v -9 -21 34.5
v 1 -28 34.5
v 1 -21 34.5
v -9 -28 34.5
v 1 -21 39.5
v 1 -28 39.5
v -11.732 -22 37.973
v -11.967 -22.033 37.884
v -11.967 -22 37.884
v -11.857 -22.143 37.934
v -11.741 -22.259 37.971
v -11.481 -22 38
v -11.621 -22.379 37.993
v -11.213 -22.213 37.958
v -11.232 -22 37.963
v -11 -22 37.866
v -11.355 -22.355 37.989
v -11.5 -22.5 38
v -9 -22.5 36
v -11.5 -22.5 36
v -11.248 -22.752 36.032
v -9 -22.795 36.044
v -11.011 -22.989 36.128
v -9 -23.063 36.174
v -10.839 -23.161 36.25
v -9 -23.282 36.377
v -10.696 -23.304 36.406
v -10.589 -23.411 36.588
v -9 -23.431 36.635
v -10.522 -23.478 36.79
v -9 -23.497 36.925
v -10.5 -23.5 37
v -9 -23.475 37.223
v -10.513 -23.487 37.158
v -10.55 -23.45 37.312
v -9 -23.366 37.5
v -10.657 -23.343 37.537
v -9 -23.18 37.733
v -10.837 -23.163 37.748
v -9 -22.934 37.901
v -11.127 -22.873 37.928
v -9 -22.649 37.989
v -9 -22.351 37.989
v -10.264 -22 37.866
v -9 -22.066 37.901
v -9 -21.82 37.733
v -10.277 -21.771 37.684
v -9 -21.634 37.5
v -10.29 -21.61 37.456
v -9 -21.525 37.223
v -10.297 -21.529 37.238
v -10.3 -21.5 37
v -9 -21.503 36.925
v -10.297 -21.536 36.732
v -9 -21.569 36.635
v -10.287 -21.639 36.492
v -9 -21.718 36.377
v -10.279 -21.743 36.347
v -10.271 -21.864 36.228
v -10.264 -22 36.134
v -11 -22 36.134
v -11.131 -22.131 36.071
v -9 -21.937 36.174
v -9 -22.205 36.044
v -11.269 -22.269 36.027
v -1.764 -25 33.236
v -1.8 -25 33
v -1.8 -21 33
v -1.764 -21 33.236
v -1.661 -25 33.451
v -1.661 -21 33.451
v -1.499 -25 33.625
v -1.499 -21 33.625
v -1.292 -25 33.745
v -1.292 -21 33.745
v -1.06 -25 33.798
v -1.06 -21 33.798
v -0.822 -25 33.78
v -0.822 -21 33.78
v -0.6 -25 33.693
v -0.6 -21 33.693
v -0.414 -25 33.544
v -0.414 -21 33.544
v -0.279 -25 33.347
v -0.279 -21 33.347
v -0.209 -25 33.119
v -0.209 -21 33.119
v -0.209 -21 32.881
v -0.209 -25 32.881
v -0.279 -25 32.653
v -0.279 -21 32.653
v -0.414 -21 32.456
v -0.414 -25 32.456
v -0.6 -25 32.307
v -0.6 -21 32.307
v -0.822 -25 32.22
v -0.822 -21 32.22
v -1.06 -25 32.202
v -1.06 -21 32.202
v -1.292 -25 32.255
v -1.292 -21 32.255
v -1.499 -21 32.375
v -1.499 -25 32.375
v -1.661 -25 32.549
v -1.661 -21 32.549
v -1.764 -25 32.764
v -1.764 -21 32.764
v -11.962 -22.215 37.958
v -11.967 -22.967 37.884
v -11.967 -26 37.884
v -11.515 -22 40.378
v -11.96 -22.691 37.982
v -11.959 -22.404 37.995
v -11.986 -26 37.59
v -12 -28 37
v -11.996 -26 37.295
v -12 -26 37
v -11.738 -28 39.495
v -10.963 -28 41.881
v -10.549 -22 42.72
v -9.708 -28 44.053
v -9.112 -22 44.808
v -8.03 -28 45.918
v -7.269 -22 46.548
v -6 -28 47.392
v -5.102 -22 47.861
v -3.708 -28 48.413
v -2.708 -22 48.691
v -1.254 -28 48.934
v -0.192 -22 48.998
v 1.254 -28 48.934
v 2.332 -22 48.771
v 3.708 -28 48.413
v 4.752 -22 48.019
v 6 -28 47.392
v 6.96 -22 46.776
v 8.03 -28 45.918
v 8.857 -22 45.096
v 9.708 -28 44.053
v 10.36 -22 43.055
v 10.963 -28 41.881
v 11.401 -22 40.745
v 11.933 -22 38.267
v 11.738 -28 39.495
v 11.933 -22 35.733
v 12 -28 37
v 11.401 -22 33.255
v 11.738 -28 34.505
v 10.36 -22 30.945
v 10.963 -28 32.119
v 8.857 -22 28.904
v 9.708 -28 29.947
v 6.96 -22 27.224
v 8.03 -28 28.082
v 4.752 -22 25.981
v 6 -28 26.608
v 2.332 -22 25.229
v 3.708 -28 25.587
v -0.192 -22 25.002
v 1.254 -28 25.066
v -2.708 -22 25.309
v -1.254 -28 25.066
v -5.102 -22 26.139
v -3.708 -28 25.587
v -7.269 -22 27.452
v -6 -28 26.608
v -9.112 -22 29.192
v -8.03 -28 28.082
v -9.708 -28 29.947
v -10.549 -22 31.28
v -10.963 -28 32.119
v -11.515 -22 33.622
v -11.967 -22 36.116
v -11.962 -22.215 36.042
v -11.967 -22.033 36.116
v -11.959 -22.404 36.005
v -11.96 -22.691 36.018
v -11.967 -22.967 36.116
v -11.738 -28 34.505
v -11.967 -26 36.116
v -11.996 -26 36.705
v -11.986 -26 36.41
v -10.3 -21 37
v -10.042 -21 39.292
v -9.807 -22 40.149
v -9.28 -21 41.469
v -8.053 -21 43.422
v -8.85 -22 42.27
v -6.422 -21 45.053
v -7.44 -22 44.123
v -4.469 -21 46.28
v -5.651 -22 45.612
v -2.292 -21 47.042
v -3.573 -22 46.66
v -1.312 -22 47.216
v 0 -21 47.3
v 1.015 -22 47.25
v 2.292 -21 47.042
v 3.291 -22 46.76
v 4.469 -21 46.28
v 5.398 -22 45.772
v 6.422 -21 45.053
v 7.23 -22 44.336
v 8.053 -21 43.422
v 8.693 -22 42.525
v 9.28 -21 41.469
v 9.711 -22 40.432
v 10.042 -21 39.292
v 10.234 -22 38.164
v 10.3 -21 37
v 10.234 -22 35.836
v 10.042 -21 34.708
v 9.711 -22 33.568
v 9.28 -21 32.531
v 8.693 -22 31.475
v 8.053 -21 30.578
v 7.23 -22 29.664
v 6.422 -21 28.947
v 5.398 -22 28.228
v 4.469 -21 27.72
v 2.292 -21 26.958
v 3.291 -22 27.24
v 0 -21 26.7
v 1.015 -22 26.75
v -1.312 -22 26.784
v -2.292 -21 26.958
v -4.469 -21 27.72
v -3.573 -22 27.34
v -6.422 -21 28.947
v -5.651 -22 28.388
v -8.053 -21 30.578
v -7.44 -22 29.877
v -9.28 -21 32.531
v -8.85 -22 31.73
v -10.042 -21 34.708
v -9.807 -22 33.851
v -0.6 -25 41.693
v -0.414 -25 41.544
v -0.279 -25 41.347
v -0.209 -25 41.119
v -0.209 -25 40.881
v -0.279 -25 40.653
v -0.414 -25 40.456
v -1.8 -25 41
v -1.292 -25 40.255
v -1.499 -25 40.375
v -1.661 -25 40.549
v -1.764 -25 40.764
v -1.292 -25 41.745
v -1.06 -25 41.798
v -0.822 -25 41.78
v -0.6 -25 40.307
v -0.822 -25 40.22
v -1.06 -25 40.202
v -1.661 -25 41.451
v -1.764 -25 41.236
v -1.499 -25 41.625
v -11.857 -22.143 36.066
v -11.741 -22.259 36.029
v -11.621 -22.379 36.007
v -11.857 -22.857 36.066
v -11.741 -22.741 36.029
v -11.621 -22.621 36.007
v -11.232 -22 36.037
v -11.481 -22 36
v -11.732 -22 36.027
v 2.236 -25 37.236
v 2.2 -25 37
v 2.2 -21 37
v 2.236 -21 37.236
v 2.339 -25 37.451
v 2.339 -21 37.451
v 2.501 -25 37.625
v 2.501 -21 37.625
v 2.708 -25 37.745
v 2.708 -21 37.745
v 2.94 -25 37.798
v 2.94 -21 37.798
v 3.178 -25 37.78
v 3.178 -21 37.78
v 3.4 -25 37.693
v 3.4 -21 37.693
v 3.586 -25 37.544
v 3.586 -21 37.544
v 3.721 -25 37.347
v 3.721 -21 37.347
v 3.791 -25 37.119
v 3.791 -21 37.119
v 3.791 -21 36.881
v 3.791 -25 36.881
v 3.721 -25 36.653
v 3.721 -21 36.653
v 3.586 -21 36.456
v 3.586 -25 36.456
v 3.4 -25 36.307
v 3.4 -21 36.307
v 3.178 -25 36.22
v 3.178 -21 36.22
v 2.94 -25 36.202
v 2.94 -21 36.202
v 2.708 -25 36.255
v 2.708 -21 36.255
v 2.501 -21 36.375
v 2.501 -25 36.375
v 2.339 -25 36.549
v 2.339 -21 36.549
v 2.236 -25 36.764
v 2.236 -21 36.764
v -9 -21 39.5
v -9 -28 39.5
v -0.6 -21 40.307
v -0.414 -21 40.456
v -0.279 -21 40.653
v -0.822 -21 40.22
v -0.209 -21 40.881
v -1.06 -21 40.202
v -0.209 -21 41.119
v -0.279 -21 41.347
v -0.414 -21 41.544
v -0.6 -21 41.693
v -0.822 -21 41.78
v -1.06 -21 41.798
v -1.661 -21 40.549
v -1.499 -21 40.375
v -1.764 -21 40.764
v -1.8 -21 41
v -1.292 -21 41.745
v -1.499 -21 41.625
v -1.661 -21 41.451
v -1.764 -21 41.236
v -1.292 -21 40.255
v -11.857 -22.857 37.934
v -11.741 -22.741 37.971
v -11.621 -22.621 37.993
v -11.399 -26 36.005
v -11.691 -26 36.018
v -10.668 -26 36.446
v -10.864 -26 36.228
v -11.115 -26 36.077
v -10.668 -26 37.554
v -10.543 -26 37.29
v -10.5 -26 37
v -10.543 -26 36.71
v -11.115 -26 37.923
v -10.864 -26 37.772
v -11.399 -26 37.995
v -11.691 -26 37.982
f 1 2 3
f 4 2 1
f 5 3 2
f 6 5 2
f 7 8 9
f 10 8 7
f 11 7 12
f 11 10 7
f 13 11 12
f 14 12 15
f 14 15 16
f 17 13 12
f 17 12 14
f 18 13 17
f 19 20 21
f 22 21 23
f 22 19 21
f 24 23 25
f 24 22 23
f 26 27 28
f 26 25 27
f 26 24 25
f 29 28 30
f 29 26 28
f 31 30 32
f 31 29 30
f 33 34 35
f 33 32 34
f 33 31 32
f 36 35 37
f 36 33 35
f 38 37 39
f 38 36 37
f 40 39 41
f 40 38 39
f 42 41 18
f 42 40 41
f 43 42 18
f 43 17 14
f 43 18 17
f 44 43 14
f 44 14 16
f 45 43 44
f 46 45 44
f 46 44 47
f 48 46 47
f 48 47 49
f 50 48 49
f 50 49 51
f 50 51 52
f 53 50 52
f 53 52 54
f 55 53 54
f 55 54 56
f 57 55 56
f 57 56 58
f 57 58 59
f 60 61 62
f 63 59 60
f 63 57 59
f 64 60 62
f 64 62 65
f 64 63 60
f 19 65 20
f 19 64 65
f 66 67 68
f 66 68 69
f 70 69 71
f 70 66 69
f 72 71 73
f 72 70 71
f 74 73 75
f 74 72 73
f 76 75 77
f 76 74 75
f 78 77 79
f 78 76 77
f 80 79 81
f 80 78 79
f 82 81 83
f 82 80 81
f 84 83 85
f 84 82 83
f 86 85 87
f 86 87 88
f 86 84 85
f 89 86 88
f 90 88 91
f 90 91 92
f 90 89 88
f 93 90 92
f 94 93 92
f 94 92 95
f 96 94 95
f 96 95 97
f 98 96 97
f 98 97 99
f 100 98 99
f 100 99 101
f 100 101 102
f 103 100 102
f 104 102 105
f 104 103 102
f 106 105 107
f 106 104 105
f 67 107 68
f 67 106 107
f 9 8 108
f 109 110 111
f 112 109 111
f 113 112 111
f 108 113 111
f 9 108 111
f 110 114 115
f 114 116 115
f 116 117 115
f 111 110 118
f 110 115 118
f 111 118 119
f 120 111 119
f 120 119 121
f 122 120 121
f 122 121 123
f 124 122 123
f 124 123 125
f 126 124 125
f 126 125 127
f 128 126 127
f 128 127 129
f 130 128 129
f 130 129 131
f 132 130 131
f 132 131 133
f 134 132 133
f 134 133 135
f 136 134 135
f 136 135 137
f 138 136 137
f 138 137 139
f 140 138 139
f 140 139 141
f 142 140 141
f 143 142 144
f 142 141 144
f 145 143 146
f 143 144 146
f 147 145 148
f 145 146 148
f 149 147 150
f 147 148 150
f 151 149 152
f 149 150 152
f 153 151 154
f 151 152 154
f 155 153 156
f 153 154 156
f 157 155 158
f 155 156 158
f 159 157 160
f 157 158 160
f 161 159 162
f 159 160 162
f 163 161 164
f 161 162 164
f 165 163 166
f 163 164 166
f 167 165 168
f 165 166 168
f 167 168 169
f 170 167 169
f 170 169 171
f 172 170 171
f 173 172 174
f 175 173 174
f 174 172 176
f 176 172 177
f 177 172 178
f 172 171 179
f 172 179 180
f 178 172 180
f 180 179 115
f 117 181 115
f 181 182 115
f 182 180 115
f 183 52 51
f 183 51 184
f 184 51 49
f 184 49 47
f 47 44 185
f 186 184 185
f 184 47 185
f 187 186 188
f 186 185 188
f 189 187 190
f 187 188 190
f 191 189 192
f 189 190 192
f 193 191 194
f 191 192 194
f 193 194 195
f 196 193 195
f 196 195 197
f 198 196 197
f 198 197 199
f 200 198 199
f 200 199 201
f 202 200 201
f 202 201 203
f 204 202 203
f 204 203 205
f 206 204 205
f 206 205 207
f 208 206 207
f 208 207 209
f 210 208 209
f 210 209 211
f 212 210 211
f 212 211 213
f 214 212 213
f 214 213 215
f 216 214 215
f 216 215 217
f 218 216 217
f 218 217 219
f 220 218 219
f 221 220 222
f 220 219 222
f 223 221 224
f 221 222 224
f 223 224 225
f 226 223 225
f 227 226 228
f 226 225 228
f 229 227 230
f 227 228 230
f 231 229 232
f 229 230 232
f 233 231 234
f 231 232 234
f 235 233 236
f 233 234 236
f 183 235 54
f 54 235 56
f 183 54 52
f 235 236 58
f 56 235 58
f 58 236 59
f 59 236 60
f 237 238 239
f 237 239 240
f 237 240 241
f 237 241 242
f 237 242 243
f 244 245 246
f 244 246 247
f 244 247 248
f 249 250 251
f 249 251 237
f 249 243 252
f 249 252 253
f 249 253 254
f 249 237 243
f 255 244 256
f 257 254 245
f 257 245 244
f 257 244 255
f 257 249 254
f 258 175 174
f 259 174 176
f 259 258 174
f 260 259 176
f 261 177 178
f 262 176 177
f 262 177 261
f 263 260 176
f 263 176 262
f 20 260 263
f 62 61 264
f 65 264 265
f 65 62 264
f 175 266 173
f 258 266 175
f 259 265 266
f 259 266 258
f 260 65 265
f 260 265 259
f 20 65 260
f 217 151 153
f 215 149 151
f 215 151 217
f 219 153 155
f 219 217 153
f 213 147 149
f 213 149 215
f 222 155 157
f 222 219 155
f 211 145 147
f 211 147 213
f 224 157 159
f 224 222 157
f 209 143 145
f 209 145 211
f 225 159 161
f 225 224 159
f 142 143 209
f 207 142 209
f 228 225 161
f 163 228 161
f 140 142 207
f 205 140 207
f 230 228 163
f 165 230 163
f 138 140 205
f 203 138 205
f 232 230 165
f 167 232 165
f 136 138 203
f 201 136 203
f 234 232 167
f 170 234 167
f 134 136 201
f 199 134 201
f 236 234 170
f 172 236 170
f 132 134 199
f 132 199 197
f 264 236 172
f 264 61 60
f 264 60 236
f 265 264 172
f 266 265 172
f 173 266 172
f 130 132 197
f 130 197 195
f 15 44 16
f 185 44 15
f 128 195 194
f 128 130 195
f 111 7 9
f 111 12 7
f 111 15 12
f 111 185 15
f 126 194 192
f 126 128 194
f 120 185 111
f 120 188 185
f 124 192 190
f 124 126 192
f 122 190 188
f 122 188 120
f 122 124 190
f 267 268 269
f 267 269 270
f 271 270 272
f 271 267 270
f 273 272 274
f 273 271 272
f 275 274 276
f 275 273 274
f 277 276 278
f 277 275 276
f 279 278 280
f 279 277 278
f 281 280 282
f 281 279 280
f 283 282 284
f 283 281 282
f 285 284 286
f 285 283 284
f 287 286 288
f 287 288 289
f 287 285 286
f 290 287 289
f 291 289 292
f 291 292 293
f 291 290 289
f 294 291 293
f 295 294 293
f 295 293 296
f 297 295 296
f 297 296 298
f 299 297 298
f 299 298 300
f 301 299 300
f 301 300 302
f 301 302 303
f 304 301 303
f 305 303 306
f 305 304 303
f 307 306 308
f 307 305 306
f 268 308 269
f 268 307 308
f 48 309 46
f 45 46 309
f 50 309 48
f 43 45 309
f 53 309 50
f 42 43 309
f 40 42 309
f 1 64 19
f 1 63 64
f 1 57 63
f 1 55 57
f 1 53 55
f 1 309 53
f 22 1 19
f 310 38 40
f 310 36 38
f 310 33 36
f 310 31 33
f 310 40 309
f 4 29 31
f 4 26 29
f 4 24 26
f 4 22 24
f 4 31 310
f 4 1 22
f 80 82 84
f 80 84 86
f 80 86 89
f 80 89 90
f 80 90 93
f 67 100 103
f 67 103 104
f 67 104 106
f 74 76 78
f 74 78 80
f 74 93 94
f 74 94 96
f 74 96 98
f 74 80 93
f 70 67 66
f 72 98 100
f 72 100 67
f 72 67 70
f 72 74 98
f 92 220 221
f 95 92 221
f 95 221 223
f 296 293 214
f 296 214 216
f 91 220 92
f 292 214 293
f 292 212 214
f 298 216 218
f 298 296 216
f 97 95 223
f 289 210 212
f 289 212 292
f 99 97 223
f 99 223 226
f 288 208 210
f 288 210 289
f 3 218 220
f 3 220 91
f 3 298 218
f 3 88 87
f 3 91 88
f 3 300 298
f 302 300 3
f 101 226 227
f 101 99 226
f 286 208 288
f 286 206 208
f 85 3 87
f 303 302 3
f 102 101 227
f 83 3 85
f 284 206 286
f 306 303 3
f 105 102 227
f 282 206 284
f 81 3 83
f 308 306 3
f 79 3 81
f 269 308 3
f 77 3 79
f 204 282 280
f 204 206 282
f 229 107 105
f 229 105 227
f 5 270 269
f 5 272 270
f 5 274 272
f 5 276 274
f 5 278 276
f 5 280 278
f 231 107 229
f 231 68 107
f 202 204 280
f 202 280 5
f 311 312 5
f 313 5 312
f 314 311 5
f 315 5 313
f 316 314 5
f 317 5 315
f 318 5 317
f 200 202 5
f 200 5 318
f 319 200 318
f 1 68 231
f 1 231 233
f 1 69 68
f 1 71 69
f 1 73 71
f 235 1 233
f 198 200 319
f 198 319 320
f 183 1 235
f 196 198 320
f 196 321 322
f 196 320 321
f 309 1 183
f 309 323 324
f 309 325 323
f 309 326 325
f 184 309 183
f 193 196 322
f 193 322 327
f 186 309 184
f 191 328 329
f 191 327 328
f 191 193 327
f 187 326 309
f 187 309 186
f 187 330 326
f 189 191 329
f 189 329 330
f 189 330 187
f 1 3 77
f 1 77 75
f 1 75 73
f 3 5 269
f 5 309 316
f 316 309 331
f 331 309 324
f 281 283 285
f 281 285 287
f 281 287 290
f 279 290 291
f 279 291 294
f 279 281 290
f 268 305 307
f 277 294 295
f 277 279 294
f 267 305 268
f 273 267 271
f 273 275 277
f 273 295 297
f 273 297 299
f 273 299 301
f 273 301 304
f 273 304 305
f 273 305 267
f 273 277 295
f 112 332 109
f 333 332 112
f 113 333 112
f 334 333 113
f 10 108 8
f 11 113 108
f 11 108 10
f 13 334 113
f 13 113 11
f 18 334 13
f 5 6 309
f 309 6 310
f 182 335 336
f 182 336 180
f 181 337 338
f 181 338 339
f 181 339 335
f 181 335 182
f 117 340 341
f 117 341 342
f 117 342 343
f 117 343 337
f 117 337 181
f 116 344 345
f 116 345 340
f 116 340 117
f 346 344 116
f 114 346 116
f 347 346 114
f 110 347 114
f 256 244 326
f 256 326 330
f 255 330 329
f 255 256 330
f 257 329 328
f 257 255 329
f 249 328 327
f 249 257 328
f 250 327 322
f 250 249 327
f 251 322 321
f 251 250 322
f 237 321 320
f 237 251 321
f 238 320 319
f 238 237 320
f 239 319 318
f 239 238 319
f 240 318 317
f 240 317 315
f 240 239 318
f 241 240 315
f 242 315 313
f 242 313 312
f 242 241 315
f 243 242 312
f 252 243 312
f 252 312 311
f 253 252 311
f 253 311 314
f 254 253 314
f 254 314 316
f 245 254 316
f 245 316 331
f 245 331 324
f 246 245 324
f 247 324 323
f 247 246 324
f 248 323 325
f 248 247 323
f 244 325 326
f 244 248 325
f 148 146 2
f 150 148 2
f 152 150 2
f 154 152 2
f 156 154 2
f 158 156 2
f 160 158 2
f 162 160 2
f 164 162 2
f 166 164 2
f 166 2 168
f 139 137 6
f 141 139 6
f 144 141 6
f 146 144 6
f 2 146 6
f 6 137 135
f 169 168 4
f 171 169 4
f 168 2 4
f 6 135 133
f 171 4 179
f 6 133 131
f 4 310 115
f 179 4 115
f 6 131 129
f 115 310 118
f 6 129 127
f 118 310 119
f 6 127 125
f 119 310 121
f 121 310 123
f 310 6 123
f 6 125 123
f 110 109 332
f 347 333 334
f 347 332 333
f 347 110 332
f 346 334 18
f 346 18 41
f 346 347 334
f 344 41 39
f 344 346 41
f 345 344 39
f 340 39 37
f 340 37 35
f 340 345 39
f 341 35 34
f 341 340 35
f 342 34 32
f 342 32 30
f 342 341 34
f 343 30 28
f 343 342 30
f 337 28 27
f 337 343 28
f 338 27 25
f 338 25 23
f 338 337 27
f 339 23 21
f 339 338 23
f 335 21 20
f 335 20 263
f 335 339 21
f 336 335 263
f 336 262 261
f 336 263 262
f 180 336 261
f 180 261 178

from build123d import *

# Parameters (mm, degrees)
CYLINDER014005814004009_R           = 1
CYLINDER014005814004009_DEPTH       = 12
CYLINDER014005814004009_PITCH_ANGLE = 90
CYLINDER014005814004010_R           = 1
CYLINDER014005814004010_DEPTH       = 4
CYLINDER014005814004010_ROLL_ANGLE  = 90
CYLINDER014005814004011_R           = 0.8
CYLINDER014005814004011_DEPTH       = 4
CYLINDER014005814004011_ROLL_ANGLE  = 90
CYLINDER014005814004012_R           = 0.8
CYLINDER014005814004012_DEPTH       = 4
CYLINDER014005814004012_ROLL_ANGLE  = 90
CYLINDER014005814004013_R           = 0.8
CYLINDER014005814004013_DEPTH       = 4
CYLINDER014005814004013_ROLL_ANGLE  = 90
BOX209_W                            = 10
BOX209_H                            = 11
BOX209_DEPTH                        = 5
CYLINDER014005814004008_R           = 10.3
CYLINDER014005814004008_DEPTH       = 7
CYLINDER014005814004008_ROLL_ANGLE  = 90
CYLINDER014005814004007_R           = 12
CYLINDER014005814004007_DEPTH       = 6
CYLINDER014005814004007_ROLL_ANGLE  = 90
CUT061098127_PLACEMENT_ANGLE        = 180


with BuildPart() as v_lec735:
    # Cylinder014005814004009 → Cylinder014005814004009 (new body)
    with BuildSketch(Plane.XY):
        Circle(CYLINDER014005814004009_R)
    extrude(amount=CYLINDER014005814004009_DEPTH)


with BuildPart() as v_lec735_1:
    # Cylinder014005814004009 pitch: moved
    add(v_lec735.part.rotate(Axis((0, 0, 0), (0, 1, 0)), CYLINDER014005814004009_PITCH_ANGLE))


with BuildPart() as v_lec735_2:
    # Cylinder014005814004009 placement: moved
    add(v_lec735_1.part.moved(Location((0, -5.5, 0))))


with BuildPart() as v_lec736:
    # Cylinder014005814004010 → Cylinder014005814004010 (new body)
    with BuildSketch(Plane.XY):
        Circle(CYLINDER014005814004010_R)
    extrude(amount=CYLINDER014005814004010_DEPTH)


with BuildPart() as v_lec736_1:
    # Cylinder014005814004010 roll: moved
    add(v_lec736.part.rotate(Axis((0, 0, 0), (1, 0, 0)), CYLINDER014005814004010_ROLL_ANGLE))


with BuildPart() as v_lec736_2:
    # Cylinder014005814004010 placement: moved
    add(v_lec736_1.part.moved(Location((11.5, -2, 0))))


with BuildPart() as v_lec737:
    # Cylinder014005814004011 → Cylinder014005814004011 (new body)
    with BuildSketch(Plane.XY):
        Circle(CYLINDER014005814004011_R)
    extrude(amount=CYLINDER014005814004011_DEPTH)


with BuildPart() as v_lec737_1:
    # Cylinder014005814004011 roll: moved
    add(v_lec737.part.rotate(Axis((0, 0, 0), (1, 0, 0)), CYLINDER014005814004011_ROLL_ANGLE))


with BuildPart() as v_lec737_2:
    # Cylinder014005814004011 placement: moved
    add(v_lec737_1.part.moved(Location((-3, -3, 0))))


with BuildPart() as v_lec738:
    # Cylinder014005814004012 → Cylinder014005814004012 (new body)
    with BuildSketch(Plane.XY):
        Circle(CYLINDER014005814004012_R)
    extrude(amount=CYLINDER014005814004012_DEPTH)


with BuildPart() as v_lec738_1:
    # Cylinder014005814004012 roll: moved
    add(v_lec738.part.rotate(Axis((0, 0, 0), (1, 0, 0)), CYLINDER014005814004012_ROLL_ANGLE))


with BuildPart() as v_lec738_2:
    # Cylinder014005814004012 placement: moved
    add(v_lec738_1.part.moved(Location((1, -3, 4))))


with BuildPart() as v_lec739:
    # Cylinder014005814004013 → Cylinder014005814004013 (new body)
    with BuildSketch(Plane.XY):
        Circle(CYLINDER014005814004013_R)
    extrude(amount=CYLINDER014005814004013_DEPTH)


with BuildPart() as v_lec739_1:
    # Cylinder014005814004013 roll: moved
    add(v_lec739.part.rotate(Axis((0, 0, 0), (1, 0, 0)), CYLINDER014005814004013_ROLL_ANGLE))


with BuildPart() as v_lec739_2:
    # Cylinder014005814004013 placement: moved
    add(v_lec739_1.part.moved(Location((1, -3, -4))))


with BuildPart() as fusion001089087:
    # Box209 → Box209 (new body)
    with BuildSketch(Plane(origin=(-1, -7, -2.5), x_dir=(1, 0, 0), z_dir=(0, 0, 1))):
        with Locations((5, 5.5)):
            Rectangle(BOX209_W, BOX209_H)
    extrude(amount=BOX209_DEPTH)

    # Fusion001089087: union Válec735, Válec736, Válec737, Válec738, Válec739
    add(v_lec735_2.part)
    add(v_lec736_2.part)
    add(v_lec737_2.part)
    add(v_lec738_2.part)
    add(v_lec739_2.part)


with BuildPart() as bat005:
    # Cylinder014005814004008 → Cylinder014005814004008 (new body)
    with BuildSketch(Plane.XY):
        Circle(CYLINDER014005814004008_R)
    extrude(amount=CYLINDER014005814004008_DEPTH)


with BuildPart() as bat005_1:
    # Cylinder014005814004008 roll: moved
    add(bat005.part.rotate(Axis((0, 0, 0), (1, 0, 0)), CYLINDER014005814004008_ROLL_ANGLE))


with BuildPart() as bat005_2:
    # Cylinder014005814004008 placement: moved
    add(bat005_1.part)


with BuildPart() as beterryknob:
    # Cylinder014005814004007 → Cylinder014005814004007 (new body)
    with BuildSketch(Plane.XY):
        Circle(CYLINDER014005814004007_R)
    extrude(amount=CYLINDER014005814004007_DEPTH)


with BuildPart() as beterryknob_1:
    # Cylinder014005814004007 roll: moved
    add(beterryknob.part.rotate(Axis((0, 0, 0), (1, 0, 0)), CYLINDER014005814004007_ROLL_ANGLE))


with BuildPart() as beterryknob_2:
    # Cylinder014005814004007 placement: moved
    add(beterryknob_1.part)

    # Fusion001089086: union bat005
    add(bat005_2.part)

    # Cut061098127: cut Fusion001089087
    add(fusion001089087.part, mode=Mode.SUBTRACT)


with BuildPart() as beterryknob_3:
    # Cut061098127 placement: moved
    add(beterryknob_2.part.moved(Location((0, -28, 37))).rotate(Axis((0, -28, 37), (0, 0, 1)), CUT061098127_PLACEMENT_ANGLE))


solid = beterryknob_3.part
